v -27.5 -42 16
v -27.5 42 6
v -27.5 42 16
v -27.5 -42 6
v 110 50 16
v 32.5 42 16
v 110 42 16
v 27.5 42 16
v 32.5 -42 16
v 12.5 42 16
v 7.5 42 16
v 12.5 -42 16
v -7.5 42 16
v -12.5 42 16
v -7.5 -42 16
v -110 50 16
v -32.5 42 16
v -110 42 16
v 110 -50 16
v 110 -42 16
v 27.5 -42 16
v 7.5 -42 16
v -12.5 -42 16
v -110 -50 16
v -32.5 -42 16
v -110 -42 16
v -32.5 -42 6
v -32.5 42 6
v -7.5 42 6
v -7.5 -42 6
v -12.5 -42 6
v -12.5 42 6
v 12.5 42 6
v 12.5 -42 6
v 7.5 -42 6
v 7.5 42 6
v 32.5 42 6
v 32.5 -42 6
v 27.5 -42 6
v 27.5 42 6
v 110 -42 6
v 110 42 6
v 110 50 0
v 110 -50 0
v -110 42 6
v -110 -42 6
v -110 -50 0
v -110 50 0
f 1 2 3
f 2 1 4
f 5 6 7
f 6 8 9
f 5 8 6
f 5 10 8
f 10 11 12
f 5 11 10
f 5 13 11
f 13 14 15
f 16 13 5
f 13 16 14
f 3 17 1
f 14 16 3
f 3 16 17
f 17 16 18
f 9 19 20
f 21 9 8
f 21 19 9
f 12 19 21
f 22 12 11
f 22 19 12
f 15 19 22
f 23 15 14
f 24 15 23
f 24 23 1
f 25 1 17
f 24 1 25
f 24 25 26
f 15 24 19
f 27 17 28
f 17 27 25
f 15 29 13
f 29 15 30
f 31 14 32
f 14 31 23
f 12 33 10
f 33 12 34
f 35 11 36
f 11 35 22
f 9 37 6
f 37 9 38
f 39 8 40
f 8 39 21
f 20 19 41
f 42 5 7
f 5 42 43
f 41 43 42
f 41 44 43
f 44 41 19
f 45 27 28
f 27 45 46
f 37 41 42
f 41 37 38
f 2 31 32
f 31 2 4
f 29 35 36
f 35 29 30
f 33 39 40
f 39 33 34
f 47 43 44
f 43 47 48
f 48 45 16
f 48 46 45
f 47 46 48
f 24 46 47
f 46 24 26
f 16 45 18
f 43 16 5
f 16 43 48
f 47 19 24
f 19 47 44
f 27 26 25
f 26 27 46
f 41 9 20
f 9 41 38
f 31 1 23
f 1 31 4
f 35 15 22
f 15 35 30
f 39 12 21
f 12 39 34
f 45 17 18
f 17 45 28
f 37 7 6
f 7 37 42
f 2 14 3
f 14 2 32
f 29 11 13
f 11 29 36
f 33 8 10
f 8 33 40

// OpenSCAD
$fn = 32;

// ----------------------------------------------------------------------
// Rib frame 220 x 100 x 16
// 4 ribs at 20 mm pitch
// ----------------------------------------------------------------------

// --- parameters (mm) ---
frame = [220, 100, 6];  // base plate size (x, y, z)
rail_w = 8;             // side rail width
ribs = 4;               // number of ribs
rib_t = 5;              // rib thickness
rib_h = 10;             // rib height above the base plate
pitch = 20;             // pitch between rib centres

// --- derived feature positions (mm) ---
span = (ribs - 1) * pitch;          // = 60   distance between the outer ribs
origin_x = -span / 2;               // = -30   X of the first rib
rib_len = frame[1] - 2 * rail_w + 2;  // = 86   rib length, 1 mm into each rail
feature_centers = [
  [origin_x + 0 * pitch, 0],
  [origin_x + 1 * pitch, 0],
  [origin_x + 2 * pitch, 0],
  [origin_x + 3 * pitch, 0]
];   // rib centre line, drives the rib loop

// base plate, two side rails, then the ribs read straight off feature_centers
union() {
  translate([-frame[0] / 2, -frame[1] / 2, 0]) cube(frame);
  translate([-frame[0] / 2, -frame[1] / 2, 0]) cube([frame[0], rail_w, frame[2] + rib_h]);
  translate([-frame[0] / 2, frame[1] / 2 - rail_w, 0]) cube([frame[0], rail_w, frame[2] + rib_h]);
  for (centre = feature_centers)
    translate([centre[0] - rib_t / 2, centre[1] - rib_len / 2, frame[2] - 1])
      cube([rib_t, rib_len, rib_h + 1]);
}
